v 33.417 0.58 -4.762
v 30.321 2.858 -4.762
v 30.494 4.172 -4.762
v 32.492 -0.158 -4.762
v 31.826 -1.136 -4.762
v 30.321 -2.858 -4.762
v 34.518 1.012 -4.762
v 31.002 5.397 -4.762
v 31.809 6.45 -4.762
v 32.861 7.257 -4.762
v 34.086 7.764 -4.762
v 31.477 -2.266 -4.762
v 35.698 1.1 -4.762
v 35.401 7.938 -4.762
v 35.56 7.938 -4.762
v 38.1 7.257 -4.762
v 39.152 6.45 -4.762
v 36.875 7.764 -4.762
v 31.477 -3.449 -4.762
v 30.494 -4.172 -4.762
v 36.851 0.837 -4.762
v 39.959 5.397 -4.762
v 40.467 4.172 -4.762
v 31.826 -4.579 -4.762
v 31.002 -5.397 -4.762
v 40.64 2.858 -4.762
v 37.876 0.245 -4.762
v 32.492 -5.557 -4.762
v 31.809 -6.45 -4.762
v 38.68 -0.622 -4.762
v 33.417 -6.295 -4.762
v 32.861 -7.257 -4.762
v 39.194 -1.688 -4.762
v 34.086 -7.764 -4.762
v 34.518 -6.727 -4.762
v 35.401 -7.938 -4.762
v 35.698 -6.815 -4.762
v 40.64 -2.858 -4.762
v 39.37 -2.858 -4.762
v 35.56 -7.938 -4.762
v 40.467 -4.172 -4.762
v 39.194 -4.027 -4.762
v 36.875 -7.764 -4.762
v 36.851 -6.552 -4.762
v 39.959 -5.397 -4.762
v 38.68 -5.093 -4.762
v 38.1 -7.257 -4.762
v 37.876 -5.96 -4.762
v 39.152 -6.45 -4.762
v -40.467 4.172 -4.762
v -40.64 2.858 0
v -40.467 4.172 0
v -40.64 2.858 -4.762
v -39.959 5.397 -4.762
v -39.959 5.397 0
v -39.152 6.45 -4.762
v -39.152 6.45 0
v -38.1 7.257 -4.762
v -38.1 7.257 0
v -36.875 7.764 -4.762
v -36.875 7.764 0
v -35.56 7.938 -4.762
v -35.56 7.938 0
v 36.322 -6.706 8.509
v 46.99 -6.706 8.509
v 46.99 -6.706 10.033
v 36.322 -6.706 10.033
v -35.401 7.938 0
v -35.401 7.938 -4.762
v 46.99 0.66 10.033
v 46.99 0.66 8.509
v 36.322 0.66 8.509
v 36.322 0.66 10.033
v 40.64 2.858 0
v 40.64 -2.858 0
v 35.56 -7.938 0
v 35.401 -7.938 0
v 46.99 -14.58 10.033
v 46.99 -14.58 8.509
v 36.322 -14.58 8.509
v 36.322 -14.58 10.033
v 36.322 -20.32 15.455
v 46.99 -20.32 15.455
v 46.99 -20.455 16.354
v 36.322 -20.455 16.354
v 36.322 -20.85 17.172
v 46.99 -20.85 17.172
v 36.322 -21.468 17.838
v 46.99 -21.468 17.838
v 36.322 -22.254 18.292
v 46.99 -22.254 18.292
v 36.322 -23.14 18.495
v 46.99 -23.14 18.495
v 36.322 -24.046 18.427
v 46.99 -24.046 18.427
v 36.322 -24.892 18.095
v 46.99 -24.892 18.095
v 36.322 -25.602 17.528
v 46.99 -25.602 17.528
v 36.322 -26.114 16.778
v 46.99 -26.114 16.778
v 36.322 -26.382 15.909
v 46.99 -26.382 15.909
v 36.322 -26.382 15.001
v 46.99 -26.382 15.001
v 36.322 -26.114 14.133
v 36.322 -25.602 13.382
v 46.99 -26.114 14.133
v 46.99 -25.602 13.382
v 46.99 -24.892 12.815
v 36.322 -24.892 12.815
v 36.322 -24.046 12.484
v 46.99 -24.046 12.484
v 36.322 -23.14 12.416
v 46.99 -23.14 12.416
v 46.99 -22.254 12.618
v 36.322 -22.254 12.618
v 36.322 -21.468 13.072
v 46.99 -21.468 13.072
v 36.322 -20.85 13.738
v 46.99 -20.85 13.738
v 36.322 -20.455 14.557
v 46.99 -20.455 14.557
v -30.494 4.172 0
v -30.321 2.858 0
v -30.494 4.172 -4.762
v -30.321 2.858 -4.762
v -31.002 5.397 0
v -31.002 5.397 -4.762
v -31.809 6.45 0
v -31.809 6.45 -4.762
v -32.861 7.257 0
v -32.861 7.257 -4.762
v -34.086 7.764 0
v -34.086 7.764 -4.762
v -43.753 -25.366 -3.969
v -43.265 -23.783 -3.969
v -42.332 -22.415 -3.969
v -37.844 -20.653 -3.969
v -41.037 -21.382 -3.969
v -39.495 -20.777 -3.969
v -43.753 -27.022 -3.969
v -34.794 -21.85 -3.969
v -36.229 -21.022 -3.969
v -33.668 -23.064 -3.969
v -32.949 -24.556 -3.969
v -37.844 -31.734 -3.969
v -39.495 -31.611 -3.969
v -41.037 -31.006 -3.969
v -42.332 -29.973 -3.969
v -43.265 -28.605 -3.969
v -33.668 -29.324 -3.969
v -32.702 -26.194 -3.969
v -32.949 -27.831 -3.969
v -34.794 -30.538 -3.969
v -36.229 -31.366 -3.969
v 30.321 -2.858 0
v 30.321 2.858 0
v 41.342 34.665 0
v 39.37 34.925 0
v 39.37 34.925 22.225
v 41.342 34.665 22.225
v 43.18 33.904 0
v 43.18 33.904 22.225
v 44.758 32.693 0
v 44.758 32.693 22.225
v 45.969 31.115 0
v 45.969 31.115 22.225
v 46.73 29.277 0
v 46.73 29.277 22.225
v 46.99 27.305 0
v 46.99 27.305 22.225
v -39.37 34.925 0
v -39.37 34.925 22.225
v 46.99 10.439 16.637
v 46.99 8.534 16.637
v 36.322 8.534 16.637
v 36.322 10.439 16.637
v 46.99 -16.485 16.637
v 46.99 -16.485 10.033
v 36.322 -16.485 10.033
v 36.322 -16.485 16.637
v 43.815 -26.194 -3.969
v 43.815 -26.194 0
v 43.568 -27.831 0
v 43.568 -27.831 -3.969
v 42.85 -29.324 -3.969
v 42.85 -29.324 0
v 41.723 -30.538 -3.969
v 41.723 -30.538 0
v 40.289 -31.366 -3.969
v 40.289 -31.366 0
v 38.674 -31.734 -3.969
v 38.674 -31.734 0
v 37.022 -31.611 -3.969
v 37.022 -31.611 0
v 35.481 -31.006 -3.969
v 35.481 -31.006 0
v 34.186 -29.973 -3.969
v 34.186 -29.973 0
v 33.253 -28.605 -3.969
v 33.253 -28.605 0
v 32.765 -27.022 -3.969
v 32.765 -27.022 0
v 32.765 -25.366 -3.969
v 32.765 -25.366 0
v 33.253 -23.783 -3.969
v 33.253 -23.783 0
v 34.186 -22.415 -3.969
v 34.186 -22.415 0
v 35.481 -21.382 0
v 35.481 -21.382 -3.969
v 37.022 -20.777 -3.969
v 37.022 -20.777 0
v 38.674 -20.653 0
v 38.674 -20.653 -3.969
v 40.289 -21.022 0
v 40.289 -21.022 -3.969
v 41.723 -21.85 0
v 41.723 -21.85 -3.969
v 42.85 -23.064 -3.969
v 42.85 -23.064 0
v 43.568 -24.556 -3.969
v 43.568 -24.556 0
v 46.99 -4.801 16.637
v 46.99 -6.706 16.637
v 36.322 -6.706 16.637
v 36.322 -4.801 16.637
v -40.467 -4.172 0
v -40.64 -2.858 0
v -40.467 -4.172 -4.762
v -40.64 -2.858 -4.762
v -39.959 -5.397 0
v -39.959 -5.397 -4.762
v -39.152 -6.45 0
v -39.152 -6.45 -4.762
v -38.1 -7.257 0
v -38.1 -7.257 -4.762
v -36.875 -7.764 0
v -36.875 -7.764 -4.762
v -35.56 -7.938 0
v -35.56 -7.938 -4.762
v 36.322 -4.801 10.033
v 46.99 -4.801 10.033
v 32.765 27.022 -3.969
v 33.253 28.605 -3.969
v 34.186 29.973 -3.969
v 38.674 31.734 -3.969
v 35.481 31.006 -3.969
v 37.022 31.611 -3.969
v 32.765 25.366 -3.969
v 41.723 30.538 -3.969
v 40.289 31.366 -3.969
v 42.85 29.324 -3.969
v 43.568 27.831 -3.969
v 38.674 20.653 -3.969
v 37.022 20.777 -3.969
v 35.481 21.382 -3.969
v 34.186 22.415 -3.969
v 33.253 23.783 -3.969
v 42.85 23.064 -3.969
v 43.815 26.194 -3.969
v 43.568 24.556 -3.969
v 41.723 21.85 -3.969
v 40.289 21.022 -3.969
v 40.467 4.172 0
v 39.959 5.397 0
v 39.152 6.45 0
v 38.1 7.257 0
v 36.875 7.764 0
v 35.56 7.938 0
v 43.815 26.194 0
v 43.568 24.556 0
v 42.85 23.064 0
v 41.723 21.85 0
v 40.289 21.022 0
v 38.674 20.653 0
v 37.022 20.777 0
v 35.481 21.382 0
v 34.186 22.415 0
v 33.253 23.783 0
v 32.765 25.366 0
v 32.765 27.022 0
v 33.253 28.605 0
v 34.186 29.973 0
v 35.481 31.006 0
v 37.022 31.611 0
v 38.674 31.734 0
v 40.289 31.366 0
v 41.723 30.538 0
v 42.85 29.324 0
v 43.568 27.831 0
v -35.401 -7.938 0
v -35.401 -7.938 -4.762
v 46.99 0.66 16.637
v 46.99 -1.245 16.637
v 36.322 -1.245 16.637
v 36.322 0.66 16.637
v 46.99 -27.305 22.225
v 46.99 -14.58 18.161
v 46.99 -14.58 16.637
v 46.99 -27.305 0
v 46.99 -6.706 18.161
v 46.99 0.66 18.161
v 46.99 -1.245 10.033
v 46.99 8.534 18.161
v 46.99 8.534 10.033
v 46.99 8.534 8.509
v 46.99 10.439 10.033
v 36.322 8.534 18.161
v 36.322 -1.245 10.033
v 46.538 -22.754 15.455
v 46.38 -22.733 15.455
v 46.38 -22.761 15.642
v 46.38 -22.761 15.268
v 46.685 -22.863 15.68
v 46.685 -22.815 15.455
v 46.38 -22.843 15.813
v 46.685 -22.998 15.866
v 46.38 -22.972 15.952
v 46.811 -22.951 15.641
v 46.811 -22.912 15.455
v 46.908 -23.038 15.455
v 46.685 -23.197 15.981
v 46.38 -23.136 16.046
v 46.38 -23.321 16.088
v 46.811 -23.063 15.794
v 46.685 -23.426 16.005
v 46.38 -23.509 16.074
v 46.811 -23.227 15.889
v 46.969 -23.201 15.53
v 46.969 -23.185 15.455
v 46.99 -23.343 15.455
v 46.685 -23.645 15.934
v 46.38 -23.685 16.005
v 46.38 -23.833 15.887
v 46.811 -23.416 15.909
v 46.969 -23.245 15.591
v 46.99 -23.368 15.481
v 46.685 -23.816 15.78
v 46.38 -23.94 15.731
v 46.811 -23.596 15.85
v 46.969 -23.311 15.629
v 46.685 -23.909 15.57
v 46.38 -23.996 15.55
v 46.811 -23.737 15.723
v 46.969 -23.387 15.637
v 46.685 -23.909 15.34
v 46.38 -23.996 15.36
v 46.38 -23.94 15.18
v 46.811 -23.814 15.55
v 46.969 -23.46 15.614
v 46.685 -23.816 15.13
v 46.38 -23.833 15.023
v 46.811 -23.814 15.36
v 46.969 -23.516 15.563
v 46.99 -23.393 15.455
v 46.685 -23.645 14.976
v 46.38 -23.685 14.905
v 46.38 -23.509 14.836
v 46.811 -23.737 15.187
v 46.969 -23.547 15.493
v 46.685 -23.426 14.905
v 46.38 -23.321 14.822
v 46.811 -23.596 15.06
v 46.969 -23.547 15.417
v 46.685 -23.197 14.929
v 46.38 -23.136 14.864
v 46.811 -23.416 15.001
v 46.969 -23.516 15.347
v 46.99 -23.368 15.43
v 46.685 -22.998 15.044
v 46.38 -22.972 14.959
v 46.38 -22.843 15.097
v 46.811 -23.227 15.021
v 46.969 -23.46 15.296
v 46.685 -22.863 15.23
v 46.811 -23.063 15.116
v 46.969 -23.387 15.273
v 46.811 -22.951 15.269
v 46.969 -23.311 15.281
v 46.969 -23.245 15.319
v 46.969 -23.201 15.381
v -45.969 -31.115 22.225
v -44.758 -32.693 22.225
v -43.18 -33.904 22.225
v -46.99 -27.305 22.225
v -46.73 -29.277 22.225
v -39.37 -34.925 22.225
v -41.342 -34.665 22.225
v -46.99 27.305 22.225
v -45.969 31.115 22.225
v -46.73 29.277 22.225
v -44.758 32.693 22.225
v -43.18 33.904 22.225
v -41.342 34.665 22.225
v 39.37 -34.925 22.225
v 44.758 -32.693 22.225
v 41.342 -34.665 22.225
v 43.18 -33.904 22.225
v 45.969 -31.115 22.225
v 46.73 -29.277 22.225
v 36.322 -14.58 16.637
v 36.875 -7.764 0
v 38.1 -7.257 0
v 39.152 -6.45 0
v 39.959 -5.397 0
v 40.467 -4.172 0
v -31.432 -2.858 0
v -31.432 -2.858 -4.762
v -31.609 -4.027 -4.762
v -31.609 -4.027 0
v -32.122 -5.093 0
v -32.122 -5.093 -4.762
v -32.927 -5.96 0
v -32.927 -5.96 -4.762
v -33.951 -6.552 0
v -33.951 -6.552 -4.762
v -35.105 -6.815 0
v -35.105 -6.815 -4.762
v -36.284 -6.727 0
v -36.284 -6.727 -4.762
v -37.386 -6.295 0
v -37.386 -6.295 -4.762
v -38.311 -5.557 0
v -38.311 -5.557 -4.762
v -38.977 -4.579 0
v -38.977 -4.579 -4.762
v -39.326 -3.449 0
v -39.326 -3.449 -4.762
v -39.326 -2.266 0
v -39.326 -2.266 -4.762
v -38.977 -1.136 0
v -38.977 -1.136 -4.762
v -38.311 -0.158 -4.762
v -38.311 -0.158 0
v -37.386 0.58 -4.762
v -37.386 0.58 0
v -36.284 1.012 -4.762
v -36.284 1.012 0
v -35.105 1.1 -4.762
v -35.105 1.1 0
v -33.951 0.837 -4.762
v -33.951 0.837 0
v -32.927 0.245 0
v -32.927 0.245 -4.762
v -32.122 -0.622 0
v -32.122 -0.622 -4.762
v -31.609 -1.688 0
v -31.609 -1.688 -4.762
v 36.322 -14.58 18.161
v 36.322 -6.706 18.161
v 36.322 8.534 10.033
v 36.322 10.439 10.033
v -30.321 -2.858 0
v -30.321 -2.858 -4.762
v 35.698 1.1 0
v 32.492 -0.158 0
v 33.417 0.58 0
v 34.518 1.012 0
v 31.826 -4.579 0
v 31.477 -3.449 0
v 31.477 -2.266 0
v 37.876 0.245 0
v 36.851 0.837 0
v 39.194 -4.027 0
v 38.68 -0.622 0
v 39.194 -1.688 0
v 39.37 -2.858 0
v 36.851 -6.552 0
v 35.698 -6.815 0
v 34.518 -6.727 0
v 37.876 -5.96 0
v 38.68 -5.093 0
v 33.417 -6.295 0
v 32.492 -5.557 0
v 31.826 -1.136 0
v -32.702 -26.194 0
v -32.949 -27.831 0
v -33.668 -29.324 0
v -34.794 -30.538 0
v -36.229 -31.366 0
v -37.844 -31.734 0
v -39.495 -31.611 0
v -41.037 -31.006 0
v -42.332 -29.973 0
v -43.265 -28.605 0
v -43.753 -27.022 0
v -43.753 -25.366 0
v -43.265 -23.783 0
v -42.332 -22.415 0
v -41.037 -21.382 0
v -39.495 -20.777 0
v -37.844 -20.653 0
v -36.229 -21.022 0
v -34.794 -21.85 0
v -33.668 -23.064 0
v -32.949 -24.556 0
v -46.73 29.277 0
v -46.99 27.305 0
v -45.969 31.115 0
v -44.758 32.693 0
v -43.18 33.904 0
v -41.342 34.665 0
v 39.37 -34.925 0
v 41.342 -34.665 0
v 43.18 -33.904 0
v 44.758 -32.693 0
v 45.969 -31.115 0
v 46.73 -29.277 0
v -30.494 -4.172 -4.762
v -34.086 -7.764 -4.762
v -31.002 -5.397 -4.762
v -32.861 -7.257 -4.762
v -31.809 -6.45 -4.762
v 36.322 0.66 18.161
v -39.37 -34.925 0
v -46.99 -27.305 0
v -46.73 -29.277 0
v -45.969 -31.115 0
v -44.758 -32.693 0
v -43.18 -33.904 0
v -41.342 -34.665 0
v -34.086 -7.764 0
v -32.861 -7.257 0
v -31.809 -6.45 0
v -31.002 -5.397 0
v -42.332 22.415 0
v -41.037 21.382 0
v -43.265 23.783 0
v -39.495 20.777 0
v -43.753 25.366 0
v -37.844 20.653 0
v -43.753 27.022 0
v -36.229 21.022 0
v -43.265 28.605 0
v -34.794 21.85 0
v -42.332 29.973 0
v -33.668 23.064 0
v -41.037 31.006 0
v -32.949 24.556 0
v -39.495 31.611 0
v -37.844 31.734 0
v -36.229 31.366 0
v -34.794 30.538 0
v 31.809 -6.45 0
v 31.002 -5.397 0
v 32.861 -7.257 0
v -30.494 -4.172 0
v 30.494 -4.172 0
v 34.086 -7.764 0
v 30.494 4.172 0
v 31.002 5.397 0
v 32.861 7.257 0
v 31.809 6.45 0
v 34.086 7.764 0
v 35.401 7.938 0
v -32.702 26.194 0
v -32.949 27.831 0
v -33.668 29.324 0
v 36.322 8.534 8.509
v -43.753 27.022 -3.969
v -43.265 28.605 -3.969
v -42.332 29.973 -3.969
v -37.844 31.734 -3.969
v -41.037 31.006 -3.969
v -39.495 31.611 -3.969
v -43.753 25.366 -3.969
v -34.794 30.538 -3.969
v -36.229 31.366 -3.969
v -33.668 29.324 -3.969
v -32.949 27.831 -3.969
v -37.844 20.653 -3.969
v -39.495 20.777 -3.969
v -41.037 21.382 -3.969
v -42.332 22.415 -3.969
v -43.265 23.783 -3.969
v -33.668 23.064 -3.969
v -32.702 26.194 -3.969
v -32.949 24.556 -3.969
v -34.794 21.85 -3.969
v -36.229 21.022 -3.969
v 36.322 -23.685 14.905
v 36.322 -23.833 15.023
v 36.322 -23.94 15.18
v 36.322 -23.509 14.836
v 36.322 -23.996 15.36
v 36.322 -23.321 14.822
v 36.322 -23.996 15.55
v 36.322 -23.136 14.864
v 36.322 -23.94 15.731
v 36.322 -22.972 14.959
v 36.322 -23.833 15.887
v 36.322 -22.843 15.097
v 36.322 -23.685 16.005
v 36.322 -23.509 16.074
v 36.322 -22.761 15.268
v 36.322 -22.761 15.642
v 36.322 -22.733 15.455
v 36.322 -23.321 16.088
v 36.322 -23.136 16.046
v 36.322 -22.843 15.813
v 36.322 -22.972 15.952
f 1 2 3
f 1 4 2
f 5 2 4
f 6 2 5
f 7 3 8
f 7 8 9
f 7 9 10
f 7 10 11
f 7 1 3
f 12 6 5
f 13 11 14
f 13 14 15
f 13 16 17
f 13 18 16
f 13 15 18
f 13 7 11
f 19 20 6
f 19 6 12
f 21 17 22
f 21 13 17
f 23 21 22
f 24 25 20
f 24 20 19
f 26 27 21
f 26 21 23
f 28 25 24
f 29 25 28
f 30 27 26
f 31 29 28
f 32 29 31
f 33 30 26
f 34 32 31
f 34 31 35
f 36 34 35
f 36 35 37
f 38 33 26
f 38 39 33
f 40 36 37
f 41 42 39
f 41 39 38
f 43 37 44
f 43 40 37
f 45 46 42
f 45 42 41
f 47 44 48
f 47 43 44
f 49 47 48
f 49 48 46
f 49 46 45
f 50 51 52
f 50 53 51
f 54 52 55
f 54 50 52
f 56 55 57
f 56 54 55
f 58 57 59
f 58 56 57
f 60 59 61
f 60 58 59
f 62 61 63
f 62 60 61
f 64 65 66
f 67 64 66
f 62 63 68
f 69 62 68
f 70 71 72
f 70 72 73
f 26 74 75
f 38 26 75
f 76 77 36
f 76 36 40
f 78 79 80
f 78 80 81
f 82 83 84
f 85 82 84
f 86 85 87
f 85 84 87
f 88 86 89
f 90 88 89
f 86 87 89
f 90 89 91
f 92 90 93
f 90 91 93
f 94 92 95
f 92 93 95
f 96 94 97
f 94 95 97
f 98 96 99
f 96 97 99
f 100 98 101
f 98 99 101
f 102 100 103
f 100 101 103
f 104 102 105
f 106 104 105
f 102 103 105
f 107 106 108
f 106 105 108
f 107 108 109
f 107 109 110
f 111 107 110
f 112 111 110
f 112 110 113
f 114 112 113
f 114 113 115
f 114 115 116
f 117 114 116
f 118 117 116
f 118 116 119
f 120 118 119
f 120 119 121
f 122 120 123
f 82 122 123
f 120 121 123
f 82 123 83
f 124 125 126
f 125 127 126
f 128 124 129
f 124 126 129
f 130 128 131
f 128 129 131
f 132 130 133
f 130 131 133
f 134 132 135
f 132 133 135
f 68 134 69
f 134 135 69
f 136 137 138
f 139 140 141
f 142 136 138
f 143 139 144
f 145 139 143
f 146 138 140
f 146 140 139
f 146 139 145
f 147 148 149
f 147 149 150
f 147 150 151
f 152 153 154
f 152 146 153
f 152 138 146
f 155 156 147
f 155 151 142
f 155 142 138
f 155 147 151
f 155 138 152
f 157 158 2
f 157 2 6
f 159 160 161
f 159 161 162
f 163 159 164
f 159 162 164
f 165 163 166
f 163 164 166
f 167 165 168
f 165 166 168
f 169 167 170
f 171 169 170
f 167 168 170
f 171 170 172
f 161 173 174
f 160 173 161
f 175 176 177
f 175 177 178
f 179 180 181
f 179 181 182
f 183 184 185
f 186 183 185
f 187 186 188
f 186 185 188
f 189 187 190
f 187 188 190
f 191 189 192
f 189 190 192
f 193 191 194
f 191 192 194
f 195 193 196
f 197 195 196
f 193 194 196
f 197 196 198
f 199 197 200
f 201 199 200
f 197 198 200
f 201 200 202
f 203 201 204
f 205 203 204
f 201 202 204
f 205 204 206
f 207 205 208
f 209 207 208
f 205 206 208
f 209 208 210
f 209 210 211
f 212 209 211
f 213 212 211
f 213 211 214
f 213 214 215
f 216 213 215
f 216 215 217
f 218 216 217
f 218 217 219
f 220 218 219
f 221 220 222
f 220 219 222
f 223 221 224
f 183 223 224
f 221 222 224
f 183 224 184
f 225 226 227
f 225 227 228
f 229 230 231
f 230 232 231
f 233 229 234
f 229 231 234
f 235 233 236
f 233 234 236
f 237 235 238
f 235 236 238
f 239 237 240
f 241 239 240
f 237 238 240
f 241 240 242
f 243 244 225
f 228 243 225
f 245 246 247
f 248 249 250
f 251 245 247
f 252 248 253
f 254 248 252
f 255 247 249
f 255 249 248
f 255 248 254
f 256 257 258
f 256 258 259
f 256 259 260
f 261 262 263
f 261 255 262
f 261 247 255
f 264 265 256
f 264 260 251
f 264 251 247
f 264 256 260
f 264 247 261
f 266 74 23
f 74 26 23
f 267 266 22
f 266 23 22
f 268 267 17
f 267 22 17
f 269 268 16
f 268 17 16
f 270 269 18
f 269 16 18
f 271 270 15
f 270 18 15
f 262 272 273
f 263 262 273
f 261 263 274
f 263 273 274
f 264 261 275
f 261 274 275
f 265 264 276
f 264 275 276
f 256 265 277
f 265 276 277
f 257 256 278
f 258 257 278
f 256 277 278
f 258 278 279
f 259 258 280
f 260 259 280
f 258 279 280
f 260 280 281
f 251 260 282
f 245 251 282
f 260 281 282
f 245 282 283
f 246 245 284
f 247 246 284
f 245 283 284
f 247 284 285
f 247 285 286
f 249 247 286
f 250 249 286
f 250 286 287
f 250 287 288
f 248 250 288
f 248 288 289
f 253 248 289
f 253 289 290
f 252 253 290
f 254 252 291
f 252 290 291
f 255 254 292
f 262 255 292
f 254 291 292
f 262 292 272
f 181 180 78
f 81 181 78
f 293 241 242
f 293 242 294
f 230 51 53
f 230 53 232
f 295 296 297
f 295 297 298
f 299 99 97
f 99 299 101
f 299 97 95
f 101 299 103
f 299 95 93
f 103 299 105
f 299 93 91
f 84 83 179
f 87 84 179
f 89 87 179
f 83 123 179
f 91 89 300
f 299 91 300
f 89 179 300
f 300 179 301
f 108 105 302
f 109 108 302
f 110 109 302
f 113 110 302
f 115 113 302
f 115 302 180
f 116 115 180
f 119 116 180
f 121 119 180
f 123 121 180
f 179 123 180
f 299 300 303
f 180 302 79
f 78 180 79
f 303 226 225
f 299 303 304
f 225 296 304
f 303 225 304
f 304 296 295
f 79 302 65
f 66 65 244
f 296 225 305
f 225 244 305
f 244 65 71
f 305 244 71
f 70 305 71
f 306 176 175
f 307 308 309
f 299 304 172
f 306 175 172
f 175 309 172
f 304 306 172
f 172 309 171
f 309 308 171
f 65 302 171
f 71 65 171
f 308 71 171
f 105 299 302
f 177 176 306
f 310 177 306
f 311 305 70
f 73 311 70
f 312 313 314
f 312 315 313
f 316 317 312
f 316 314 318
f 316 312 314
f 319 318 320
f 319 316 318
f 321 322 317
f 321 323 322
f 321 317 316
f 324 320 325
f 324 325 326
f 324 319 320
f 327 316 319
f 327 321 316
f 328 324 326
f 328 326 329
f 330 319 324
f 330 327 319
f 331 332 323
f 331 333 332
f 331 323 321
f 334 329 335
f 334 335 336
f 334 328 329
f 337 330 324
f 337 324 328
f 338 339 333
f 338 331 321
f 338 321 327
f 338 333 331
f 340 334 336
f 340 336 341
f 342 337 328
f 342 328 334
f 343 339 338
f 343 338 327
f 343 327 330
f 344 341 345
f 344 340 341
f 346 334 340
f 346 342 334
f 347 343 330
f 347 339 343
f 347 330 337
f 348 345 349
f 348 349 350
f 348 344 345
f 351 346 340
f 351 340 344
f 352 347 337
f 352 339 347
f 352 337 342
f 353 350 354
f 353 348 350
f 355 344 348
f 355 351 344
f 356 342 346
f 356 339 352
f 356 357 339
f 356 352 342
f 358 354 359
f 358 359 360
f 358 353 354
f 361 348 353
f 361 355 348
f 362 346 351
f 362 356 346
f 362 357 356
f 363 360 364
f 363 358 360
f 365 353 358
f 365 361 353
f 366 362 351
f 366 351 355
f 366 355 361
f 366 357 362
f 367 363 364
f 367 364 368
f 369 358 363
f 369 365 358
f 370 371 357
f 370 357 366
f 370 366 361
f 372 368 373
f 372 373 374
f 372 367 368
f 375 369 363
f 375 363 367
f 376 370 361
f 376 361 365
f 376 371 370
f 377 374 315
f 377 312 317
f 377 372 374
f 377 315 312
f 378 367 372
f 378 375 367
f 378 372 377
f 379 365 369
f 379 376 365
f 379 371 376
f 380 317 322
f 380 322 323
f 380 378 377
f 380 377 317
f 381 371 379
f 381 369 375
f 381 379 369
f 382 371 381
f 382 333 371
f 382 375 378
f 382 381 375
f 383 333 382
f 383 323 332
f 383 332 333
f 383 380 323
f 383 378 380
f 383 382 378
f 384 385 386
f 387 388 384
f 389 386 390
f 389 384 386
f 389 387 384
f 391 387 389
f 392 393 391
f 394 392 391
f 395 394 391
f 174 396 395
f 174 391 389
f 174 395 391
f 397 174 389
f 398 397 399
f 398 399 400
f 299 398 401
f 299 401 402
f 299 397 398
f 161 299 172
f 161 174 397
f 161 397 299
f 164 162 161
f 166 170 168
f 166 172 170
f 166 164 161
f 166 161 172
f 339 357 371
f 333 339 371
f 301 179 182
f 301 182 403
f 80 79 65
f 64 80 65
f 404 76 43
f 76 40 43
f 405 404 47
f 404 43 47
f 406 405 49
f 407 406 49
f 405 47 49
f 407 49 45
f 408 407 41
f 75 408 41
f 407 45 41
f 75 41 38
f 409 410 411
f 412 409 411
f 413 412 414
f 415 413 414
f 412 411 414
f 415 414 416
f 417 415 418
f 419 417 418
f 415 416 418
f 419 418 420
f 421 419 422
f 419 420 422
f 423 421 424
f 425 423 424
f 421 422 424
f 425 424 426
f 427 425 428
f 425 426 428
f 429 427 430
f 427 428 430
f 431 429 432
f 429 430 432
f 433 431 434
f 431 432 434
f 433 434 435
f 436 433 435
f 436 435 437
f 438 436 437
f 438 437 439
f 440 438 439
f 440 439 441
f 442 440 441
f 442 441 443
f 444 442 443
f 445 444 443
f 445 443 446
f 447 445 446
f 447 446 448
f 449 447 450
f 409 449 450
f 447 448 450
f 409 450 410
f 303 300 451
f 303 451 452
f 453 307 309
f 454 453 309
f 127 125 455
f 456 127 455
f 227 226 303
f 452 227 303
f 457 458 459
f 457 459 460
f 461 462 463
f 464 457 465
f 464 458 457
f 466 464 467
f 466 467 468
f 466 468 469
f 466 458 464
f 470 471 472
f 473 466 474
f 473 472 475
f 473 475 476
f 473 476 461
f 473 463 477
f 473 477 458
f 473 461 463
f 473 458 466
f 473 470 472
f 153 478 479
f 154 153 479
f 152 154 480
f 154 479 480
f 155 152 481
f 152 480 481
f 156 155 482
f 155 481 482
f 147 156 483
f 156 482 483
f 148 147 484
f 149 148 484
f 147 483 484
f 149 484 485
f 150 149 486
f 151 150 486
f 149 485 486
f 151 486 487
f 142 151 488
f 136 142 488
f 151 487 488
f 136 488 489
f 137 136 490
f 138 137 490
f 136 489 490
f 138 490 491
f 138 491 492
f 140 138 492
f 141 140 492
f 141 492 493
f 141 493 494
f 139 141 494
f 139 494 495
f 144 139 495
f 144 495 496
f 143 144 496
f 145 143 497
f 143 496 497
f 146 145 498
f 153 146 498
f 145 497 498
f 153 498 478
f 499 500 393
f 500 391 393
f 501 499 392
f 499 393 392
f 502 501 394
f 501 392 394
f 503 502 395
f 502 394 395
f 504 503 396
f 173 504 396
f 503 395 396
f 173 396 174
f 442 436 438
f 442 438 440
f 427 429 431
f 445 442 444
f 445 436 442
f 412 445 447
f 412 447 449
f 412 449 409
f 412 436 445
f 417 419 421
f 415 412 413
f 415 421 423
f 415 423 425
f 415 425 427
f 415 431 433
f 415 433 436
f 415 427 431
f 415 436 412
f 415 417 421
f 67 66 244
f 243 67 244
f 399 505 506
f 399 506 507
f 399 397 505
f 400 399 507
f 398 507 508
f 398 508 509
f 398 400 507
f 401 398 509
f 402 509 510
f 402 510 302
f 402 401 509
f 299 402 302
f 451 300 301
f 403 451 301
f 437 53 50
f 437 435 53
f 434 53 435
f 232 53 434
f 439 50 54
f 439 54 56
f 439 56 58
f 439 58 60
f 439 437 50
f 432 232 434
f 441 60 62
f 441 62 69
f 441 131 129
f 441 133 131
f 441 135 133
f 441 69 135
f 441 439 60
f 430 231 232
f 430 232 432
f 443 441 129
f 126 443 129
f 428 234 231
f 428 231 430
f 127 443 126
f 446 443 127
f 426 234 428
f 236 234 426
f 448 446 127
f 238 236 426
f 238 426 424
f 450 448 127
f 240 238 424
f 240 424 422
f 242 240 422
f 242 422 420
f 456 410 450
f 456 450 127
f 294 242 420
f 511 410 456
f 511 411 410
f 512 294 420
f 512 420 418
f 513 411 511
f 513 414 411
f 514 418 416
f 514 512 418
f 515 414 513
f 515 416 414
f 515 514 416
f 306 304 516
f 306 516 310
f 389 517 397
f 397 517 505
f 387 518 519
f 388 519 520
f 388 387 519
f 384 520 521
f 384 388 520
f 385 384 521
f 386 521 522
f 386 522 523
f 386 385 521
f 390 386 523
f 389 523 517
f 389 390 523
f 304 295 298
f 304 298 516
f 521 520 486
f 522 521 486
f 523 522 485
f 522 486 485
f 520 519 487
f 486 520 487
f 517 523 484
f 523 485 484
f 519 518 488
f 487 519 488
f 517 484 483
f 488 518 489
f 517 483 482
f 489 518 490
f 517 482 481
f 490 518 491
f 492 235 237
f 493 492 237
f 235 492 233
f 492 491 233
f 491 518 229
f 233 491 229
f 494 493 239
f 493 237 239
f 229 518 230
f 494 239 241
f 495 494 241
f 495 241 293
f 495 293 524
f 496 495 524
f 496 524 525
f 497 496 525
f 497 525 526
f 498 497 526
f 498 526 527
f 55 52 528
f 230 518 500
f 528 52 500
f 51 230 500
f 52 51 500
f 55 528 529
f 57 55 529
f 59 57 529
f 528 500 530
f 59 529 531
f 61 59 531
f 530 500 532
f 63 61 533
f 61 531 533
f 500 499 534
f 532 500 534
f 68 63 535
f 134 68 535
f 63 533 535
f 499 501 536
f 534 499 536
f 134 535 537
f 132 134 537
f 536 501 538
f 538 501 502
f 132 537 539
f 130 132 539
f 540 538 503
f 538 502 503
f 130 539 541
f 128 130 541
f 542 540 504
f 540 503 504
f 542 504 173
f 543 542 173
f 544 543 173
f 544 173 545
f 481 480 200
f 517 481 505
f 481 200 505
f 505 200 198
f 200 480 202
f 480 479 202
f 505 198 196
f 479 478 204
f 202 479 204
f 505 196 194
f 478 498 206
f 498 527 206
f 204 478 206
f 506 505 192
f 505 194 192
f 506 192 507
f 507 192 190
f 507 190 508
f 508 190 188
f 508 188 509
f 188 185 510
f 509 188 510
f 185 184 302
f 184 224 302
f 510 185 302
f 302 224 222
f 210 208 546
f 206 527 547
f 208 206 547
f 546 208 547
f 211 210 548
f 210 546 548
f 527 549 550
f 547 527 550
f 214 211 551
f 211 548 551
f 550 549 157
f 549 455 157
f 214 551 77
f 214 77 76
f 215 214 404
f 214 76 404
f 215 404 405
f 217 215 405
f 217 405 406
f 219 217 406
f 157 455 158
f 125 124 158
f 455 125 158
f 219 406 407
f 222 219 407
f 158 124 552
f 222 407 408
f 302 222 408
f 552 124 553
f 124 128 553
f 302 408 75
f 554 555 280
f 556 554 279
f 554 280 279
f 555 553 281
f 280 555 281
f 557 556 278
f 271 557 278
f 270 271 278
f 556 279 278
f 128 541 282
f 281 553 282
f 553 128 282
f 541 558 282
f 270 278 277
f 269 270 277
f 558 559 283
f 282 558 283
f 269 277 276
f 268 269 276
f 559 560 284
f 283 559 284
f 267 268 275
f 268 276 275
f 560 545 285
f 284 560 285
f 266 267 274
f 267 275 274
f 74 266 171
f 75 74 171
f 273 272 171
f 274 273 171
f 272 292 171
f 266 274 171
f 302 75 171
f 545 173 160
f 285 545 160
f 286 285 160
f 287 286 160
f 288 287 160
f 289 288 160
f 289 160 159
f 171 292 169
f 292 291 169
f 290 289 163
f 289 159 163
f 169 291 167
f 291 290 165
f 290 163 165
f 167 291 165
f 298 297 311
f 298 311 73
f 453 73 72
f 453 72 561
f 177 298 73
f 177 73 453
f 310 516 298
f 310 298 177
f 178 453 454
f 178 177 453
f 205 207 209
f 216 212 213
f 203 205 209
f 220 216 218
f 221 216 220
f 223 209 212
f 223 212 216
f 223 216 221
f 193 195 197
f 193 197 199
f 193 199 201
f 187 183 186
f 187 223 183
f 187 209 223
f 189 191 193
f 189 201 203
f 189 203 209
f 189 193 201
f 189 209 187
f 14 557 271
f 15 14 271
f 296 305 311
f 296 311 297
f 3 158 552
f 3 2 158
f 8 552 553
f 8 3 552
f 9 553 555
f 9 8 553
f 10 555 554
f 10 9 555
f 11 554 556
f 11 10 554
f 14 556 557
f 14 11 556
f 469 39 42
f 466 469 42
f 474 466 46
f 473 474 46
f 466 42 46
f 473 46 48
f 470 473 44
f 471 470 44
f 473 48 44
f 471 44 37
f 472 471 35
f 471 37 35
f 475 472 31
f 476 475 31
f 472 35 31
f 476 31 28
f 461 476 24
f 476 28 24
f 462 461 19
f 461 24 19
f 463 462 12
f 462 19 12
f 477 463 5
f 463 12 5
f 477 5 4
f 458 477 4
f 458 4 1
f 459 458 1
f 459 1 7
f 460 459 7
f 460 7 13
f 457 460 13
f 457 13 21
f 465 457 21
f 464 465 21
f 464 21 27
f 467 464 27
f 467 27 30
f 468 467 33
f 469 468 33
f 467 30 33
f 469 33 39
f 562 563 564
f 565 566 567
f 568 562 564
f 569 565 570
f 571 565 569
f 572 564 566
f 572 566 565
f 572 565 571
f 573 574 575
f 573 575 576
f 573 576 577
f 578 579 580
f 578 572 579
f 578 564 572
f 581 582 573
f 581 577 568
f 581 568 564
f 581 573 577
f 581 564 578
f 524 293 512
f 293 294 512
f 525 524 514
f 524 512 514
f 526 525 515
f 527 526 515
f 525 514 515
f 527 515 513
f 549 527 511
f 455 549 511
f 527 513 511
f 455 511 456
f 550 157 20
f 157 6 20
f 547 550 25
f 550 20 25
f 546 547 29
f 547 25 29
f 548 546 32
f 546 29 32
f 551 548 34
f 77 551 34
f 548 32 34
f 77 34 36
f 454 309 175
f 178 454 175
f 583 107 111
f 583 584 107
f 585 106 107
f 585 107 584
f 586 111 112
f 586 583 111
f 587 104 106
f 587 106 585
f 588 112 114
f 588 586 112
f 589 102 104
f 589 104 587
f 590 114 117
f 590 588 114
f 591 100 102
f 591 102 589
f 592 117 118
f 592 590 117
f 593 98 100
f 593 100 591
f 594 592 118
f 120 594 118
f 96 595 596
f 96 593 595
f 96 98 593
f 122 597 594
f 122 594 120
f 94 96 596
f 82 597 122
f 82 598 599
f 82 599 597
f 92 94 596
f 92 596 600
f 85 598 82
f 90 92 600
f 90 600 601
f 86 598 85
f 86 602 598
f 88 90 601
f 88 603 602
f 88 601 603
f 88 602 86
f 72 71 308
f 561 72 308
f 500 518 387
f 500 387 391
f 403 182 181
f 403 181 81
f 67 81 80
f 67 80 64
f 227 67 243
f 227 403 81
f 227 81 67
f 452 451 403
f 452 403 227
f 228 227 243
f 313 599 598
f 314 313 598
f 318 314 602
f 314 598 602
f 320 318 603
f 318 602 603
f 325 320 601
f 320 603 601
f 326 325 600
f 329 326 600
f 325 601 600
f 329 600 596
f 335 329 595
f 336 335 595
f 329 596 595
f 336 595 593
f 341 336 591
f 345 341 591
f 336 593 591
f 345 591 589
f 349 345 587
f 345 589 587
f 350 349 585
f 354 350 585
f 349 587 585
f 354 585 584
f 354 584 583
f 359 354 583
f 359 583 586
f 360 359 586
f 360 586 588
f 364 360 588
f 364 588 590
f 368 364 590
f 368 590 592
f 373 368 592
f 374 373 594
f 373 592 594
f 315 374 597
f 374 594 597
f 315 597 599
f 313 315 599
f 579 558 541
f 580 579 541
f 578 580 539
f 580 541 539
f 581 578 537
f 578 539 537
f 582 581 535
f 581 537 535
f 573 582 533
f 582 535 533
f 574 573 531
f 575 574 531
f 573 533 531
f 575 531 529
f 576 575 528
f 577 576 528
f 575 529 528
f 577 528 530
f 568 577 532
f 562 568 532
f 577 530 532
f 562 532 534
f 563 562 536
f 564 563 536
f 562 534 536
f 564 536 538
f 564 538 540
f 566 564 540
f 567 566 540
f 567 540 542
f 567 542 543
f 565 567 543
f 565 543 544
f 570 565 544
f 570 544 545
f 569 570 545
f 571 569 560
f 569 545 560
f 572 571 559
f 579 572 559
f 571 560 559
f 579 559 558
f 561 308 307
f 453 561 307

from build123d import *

# Parameters (mm, degrees)
F0_W      = 93.98
F0_H      = 69.85
F1_DEPTH  = 22.225
F2_W      = 10.31875
F2_H      = 15.875
F3_DEPTH  = 4.7625
F4_R      = 5.08
F5_R      = 5.55625
F6_DEPTH  = 3.96875
F8_R      = 7.62
F9_W      = 7.874
F9_H      = 1.524
F9_W_2    = 1.905
F9_H_2    = 6.604
F10_DEPTH = 10.668
F11_DEPTH = 10.668
F9_R      = 3.048
F12_DEPTH = 10.668
F13_R     = 0.635
F14_DEPTH = 10.668
F15_R     = 0.6096
F7_R      = 3.96875
F16_DEPTH = 4.7625


with BuildPart() as f1:
    # F0 (on Top) → F1 (new body)
    with BuildSketch(Plane.XY):
        Rectangle(F0_W, F0_H)
    extrude(amount=F1_DEPTH)

    # F2 (on face) → F3 (join)
    with BuildSketch(Plane(origin=(0, 0, 0), x_dir=(1, 0, 0), z_dir=(0, 0, -1))):
        with Locations((-35.480625, 0)):
            Rectangle(F2_W, F2_H)
        with Locations((35.480625, 0)):
            Rectangle(F2_W, F2_H)
    extrude(amount=F3_DEPTH)

    # F4
    f4_edges = [f1.edges().sort_by_distance(p)[0] for p in [
        (-30.32125, -7.9375, -2.38125),
        (-40.64, -7.9375, -2.38125),
        (30.32125, -7.9375, -2.38125),
        (40.64, -7.9375, -2.38125),
        (40.64, 7.9375, -2.38125),
        (30.32125, 7.9375, -2.38125),
        (-30.32125, 7.9375, -2.38125),
        (-40.64, 7.9375, -2.38125),
    ]]
    fillet(f4_edges, radius=F4_R)

    # F5 (on face) → F6 (join)
    with BuildSketch(Plane(origin=(0, 0, 0), x_dir=(1, 0, 0), z_dir=(0, 0, -1))):
        with Locations((38.25875, 26.19375)):
            Circle(F5_R)
        with Locations((-38.25875, -26.19375)):
            Circle(F5_R)
        with Locations((38.25875, -26.19375)):
            Circle(F5_R)
        with Locations((-38.25875, 26.19375)):
            Circle(F5_R)
    extrude(amount=F6_DEPTH)

    # F8
    f8_edges = [f1.edges().sort_by_distance(p)[0] for p in [
        (-46.99, -34.925, 11.1125),
        (46.99, -34.925, 11.1125),
        (46.99, 34.925, 11.1125),
        (-46.99, 34.925, 11.1125),
    ]]
    fillet(f8_edges, radius=F8_R)

    # F9 (on face) → F10 (cut)
    with BuildSketch(Plane.YZ.offset(46.99)):
        with Locations((-10.643445003, 17.399)):
            Rectangle(F9_W, F9_H)
        with Locations((-5.753945003, 13.335)):
            Rectangle(F9_W_2, F9_H_2)
        with Locations((-10.643445003, 13.335)):
            Rectangle(F9_W, F9_H_2)
        with Locations((-15.532945003, 13.335)):
            Rectangle(F9_W_2, F9_H_2)
        with Locations((-10.643445003, 9.271)):
            Rectangle(F9_W, F9_H)
    extrude(amount=-F10_DEPTH, mode=Mode.SUBTRACT)

    # F9 (on face) → F11 (cut)
    with BuildSketch(Plane.YZ.offset(46.99)):
        with Locations((-0.292945003, 13.335)):
            Rectangle(F9_W_2, F9_H_2)
        with Locations((4.596554997, 17.399)):
            Rectangle(F9_W, F9_H)
        with Locations((4.596554997, 9.271)):
            Rectangle(F9_W, F9_H)
        with Locations((4.596554997, 13.335)):
            Rectangle(F9_W, F9_H_2)
        with Locations((9.486054997, 13.335)):
            Rectangle(F9_W_2, F9_H_2)
    extrude(amount=-F11_DEPTH, mode=Mode.SUBTRACT)

    # F9 (on face) → F12 (cut)
    with BuildSketch(Plane.YZ.offset(46.99)):
        with Locations((-23.368, 15.4551044106)):
            Circle(F9_R)
    extrude(amount=-F12_DEPTH, mode=Mode.SUBTRACT)

    # F13 (on face) → F14 (join)
    with BuildSketch(Plane.YZ.offset(36.322)):
        with Locations((-23.368, 15.4551044106)):
            Circle(F13_R)
    extrude(amount=F14_DEPTH)

    # F15
    f15_edges = [f1.edges().sort_by_distance(p)[0] for p in [
        (46.99, -24.003, 15.455104),
    ]]
    fillet(f15_edges, radius=F15_R)

    # F7 (on face) → F16 (cut)
    with BuildSketch(Plane(origin=(0, 0, -4.7625), x_dir=(1, 0, 0), z_dir=(0, 0, -1))):
        with Locations((-35.40125, 2.8575)):
            Circle(F7_R)
        with Locations((35.40125, 2.8575)):
            Circle(F7_R)
    extrude(amount=-F16_DEPTH, mode=Mode.SUBTRACT)


solid = f1.part
